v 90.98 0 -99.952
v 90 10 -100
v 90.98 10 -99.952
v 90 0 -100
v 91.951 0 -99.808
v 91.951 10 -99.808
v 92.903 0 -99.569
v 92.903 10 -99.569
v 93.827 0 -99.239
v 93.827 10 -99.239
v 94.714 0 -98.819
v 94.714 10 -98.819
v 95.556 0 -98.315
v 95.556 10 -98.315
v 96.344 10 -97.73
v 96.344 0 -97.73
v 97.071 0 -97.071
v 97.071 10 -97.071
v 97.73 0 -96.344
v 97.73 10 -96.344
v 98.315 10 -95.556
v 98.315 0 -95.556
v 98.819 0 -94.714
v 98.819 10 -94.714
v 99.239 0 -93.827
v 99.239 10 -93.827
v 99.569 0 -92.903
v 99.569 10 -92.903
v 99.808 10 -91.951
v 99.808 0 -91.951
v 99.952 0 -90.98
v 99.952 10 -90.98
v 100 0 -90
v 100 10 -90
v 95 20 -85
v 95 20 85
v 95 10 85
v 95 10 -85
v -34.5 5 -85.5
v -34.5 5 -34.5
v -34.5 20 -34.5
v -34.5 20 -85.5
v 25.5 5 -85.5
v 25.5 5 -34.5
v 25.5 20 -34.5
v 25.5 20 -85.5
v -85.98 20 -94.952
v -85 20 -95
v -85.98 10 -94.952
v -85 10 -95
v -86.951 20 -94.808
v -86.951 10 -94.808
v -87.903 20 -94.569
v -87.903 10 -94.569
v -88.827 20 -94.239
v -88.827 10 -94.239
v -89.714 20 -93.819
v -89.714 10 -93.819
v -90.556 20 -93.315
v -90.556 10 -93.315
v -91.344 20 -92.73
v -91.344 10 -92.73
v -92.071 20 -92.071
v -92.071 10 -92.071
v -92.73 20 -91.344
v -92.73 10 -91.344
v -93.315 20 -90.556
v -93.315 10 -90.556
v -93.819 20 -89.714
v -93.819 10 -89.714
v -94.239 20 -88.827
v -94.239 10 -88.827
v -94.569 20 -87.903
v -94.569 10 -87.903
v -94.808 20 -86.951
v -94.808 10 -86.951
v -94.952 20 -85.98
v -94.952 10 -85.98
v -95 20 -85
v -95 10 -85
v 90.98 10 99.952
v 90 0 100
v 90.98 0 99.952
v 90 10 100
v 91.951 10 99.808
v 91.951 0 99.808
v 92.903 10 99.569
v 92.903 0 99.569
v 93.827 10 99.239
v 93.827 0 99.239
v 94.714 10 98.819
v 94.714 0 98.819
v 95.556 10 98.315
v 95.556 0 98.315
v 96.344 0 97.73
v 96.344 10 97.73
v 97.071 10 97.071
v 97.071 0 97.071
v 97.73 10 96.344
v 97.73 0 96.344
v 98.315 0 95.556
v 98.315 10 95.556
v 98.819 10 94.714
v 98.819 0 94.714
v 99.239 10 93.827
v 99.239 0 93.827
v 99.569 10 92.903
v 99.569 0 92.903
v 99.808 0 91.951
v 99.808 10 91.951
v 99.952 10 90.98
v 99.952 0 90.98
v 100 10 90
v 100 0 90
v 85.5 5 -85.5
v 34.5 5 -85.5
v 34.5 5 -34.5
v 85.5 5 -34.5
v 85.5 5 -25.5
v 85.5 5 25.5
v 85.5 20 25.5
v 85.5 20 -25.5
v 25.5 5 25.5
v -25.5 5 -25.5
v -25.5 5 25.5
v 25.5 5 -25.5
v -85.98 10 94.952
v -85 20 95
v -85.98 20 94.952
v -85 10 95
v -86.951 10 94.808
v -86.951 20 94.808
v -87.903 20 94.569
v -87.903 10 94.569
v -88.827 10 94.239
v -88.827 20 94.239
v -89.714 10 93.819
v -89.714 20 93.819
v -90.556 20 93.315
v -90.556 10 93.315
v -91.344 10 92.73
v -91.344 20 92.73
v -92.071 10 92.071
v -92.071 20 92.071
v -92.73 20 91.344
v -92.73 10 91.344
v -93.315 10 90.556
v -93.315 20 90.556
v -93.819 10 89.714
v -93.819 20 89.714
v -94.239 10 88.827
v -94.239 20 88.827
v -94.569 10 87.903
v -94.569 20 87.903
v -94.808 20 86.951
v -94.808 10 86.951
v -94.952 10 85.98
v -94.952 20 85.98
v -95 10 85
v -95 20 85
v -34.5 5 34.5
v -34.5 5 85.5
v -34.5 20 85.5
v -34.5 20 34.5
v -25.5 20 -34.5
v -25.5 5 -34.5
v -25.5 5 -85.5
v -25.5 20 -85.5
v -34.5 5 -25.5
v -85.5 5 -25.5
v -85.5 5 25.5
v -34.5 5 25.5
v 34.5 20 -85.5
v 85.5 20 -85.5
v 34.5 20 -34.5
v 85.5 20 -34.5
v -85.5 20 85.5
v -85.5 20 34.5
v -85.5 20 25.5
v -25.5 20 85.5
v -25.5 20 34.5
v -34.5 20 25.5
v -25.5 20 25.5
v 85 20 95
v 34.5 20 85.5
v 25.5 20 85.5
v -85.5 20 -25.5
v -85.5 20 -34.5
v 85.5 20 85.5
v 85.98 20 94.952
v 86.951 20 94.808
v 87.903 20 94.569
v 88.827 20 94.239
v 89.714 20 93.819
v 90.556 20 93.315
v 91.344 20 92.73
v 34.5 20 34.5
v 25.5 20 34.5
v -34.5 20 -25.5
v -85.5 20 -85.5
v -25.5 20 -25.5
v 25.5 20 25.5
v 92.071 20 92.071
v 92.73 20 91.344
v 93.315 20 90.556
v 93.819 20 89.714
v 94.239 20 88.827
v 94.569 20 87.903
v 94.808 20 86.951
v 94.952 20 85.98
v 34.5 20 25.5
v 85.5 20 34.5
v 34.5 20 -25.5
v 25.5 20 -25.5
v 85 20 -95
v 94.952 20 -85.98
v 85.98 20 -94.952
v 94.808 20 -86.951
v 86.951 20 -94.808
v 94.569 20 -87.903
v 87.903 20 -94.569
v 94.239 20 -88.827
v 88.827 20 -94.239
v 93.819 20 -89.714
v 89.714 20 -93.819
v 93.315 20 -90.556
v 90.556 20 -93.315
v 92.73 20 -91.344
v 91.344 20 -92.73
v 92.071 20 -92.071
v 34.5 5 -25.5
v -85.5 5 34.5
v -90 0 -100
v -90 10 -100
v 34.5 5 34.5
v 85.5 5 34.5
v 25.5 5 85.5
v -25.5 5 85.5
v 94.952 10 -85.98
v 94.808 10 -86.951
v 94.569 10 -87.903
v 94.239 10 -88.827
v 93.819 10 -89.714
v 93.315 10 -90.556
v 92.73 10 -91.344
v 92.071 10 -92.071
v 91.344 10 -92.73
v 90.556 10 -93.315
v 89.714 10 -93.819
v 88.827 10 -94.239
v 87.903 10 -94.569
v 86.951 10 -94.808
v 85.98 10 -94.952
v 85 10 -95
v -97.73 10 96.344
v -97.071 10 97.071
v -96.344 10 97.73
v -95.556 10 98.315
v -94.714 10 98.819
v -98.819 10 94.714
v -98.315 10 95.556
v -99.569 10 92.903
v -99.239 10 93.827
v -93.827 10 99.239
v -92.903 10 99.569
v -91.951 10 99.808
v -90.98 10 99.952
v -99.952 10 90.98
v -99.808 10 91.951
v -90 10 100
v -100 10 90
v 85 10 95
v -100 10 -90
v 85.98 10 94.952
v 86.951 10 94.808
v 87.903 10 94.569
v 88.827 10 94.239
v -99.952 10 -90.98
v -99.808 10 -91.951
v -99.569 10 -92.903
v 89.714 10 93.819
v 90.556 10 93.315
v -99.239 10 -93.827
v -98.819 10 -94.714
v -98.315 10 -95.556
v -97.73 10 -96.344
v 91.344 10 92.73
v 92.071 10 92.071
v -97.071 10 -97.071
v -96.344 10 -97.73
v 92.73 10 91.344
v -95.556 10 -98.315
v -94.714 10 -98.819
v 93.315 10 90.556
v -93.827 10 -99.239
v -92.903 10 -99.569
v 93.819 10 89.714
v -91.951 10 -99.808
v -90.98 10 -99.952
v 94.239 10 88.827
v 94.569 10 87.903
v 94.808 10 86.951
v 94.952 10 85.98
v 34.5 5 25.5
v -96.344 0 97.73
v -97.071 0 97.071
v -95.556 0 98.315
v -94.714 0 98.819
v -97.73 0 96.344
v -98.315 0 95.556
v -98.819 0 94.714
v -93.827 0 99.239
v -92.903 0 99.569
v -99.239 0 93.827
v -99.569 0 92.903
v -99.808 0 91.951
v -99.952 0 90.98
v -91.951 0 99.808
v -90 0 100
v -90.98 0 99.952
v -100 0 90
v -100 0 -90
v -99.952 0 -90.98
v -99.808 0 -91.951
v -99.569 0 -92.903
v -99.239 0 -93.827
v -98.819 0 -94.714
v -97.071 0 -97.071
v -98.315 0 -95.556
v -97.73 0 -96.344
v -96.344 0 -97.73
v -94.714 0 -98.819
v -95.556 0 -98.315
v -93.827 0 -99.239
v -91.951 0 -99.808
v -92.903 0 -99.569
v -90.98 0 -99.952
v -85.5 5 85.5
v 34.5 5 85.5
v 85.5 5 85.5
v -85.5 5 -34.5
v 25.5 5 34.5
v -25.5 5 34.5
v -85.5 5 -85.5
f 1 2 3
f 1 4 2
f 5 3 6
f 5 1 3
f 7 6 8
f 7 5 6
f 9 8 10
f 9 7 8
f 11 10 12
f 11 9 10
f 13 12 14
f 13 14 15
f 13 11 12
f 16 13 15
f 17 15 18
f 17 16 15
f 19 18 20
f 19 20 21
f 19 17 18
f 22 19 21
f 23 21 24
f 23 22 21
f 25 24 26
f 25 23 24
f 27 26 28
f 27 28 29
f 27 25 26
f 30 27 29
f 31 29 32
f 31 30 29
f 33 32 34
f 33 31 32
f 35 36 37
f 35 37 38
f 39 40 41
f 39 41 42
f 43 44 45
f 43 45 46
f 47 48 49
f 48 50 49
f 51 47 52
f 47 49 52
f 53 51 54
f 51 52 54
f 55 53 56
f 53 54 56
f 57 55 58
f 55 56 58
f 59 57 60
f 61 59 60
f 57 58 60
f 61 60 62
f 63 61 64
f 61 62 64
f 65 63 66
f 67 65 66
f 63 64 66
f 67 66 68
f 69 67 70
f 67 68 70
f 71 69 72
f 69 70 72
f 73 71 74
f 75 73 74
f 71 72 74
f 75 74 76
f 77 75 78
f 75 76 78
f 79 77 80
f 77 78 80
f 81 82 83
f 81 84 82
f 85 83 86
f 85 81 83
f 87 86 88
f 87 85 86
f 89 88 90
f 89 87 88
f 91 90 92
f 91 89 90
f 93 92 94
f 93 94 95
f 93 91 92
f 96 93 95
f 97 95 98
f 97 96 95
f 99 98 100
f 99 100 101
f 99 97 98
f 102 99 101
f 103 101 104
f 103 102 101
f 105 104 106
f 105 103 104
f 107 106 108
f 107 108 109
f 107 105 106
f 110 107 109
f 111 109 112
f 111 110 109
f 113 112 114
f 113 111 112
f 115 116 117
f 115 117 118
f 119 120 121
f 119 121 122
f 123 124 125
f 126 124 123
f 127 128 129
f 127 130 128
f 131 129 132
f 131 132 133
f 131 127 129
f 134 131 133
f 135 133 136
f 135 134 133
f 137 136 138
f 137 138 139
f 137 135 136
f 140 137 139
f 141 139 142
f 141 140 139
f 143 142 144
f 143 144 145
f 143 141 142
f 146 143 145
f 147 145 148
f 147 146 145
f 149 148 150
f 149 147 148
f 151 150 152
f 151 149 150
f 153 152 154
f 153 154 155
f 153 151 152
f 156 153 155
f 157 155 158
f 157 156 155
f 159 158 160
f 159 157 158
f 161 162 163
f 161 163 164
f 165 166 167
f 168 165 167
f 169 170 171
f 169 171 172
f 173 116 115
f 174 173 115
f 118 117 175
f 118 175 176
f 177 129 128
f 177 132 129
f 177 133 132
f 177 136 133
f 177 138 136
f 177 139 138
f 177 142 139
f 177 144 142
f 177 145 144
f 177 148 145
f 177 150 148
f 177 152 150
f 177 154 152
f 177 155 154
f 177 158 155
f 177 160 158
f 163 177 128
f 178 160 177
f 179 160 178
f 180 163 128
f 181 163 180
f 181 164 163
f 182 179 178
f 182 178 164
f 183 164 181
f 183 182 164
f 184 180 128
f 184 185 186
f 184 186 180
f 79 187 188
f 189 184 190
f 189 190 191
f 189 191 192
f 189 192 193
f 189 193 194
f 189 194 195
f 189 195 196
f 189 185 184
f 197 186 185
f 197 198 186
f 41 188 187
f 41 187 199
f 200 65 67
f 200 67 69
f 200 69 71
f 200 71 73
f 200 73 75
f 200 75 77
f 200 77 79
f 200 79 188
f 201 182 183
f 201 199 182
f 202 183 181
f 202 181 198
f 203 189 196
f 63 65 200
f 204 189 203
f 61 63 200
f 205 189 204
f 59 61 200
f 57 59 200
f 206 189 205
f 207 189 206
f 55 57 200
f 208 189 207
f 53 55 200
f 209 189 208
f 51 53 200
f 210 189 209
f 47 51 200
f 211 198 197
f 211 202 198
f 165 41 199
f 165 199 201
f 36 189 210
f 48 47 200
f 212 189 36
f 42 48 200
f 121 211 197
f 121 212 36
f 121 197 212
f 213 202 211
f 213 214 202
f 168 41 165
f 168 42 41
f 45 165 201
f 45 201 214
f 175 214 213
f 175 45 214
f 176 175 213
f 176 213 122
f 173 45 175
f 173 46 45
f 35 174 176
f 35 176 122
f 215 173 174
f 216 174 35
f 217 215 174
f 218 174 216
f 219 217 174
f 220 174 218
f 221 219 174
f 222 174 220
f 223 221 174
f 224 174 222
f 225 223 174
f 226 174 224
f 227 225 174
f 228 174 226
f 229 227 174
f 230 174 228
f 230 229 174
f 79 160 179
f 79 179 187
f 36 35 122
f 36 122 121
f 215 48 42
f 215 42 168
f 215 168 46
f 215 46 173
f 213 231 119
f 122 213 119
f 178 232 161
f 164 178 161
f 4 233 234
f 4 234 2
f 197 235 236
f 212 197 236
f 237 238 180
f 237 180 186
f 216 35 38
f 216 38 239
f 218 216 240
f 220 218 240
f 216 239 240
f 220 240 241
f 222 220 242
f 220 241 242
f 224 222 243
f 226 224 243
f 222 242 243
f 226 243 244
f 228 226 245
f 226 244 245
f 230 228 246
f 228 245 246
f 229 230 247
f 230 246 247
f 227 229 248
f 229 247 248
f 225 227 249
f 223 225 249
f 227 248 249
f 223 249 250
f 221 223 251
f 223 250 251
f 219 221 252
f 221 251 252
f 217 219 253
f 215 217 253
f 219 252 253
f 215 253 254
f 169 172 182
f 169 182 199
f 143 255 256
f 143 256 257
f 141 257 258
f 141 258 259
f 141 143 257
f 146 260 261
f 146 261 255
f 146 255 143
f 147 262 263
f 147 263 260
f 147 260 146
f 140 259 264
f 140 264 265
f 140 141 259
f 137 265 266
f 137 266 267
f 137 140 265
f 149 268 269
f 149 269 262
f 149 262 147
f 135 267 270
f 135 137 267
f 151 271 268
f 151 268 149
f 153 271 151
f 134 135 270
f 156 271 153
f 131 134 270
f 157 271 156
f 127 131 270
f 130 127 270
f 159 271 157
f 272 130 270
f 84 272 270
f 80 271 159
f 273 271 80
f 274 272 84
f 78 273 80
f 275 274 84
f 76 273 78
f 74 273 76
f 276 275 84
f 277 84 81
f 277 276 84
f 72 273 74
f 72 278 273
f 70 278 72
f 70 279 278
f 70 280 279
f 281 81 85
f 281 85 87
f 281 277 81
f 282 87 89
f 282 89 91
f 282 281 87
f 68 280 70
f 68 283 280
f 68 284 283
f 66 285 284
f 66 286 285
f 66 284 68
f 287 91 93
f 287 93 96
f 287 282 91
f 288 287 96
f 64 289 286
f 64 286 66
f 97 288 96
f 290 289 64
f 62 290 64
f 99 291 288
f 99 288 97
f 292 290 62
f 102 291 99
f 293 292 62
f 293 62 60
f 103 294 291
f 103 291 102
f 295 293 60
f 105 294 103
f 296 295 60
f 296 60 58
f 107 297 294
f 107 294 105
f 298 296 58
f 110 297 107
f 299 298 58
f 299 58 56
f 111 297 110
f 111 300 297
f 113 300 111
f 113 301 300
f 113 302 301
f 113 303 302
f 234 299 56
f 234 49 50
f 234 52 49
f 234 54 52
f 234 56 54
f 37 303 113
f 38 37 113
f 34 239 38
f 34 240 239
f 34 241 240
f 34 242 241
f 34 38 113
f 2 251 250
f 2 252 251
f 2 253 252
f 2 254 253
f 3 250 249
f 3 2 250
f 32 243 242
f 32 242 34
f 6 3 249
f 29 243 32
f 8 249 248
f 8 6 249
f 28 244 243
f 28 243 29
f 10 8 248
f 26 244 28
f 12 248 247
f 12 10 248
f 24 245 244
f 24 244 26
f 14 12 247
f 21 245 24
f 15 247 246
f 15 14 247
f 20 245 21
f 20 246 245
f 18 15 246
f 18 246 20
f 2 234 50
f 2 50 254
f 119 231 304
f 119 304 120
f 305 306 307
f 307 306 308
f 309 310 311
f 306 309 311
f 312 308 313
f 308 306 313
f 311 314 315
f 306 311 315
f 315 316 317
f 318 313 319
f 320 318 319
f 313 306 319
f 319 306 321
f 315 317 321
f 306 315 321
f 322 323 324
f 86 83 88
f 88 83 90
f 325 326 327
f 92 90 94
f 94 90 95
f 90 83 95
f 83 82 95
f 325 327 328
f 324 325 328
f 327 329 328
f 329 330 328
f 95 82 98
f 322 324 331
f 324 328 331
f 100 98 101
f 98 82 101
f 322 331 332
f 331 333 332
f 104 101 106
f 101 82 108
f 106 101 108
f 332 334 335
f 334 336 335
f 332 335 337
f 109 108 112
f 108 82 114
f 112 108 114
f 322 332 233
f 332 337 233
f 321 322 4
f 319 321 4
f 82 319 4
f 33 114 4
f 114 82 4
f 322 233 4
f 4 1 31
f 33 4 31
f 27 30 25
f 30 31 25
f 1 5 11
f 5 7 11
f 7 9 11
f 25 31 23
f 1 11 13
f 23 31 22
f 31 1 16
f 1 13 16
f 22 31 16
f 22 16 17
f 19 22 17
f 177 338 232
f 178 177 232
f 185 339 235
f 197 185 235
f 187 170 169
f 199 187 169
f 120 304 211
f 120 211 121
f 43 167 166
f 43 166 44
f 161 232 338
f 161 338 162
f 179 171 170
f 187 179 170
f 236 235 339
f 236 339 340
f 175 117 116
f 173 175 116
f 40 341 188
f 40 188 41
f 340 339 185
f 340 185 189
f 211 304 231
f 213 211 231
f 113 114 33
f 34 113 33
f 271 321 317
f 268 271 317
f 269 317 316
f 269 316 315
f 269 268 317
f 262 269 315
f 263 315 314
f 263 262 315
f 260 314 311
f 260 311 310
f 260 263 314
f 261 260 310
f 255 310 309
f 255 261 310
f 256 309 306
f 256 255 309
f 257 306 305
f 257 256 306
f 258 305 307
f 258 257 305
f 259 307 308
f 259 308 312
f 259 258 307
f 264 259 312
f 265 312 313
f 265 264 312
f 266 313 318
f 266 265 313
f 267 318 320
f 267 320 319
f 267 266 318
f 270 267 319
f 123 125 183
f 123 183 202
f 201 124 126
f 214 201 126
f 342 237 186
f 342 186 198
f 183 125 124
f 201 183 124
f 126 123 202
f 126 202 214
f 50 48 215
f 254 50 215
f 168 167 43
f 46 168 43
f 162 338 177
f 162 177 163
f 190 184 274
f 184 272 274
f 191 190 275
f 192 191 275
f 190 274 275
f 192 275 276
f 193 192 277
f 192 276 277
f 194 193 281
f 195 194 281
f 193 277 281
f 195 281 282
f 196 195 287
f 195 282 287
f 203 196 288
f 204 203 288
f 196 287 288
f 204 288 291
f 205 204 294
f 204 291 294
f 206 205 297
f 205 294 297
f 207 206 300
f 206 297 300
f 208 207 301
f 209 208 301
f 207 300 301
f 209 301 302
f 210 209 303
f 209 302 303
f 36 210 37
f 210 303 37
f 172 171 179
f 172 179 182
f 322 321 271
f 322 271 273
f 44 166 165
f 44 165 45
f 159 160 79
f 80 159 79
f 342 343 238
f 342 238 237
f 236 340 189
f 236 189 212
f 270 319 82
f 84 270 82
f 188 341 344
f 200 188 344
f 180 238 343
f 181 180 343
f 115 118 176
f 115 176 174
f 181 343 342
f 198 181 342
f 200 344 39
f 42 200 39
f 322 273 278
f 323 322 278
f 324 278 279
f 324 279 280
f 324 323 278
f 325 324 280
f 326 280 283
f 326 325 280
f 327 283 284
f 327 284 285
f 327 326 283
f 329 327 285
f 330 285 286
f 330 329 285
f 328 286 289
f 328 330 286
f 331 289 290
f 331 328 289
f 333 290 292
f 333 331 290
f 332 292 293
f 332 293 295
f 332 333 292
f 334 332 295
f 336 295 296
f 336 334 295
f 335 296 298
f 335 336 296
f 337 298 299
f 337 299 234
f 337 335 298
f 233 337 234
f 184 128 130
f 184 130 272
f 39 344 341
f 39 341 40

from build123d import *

# Parameters (mm, degrees)
SKETCH_1_W          = 200
SKETCH_1_H          = 200
SKETCH_1_W_2        = 51
SKETCH_1_H_2        = 51
EXTRUDE_1_DEPTH     = 20
SKETCH_1_2_W        = 200
SKETCH_1_2_H        = 200
EXTRUDE_2_DEPTH     = 5
SKETCH_2_W          = 200
SKETCH_2_H          = 200
SKETCH_2_W_2        = 190
SKETCH_2_H_2        = 190
CUT_EXTRUDE_1_DEPTH = 10
FILLET_1_R          = 10


with BuildPart() as part:
    # 草图1 → 凸台-拉伸1 (new body)
    with BuildSketch(Plane(origin=(0, 0, 0), x_dir=(1, 0, 0), z_dir=(0, 1, 0))):
        Rectangle(SKETCH_1_W, SKETCH_1_H)
        with Locations((0, 60)):
            Rectangle(SKETCH_1_W_2, SKETCH_1_H_2, mode=Mode.SUBTRACT)
        with Locations((-60, 60)):
            Rectangle(SKETCH_1_W_2, SKETCH_1_H_2, mode=Mode.SUBTRACT)
        with Locations((60, 60)):
            Rectangle(SKETCH_1_W_2, SKETCH_1_H_2, mode=Mode.SUBTRACT)
        Rectangle(SKETCH_1_W_2, SKETCH_1_H_2, mode=Mode.SUBTRACT)
        with Locations((60, 0)):
            Rectangle(SKETCH_1_W_2, SKETCH_1_H_2, mode=Mode.SUBTRACT)
        with Locations((0, -60)):
            Rectangle(SKETCH_1_W_2, SKETCH_1_H_2, mode=Mode.SUBTRACT)
        with Locations((60, -60)):
            Rectangle(SKETCH_1_W_2, SKETCH_1_H_2, mode=Mode.SUBTRACT)
        with Locations((-60, 0)):
            Rectangle(SKETCH_1_W_2, SKETCH_1_H_2, mode=Mode.SUBTRACT)
        with Locations((-60, -60)):
            Rectangle(SKETCH_1_W_2, SKETCH_1_H_2, mode=Mode.SUBTRACT)
    extrude(amount=EXTRUDE_1_DEPTH)

    # 草图1<2> → 凸台-拉伸2 (add)
    with BuildSketch(Plane(origin=(0, 0, 0), x_dir=(1, 0, 0), z_dir=(0, 1, 0))):
        Rectangle(SKETCH_1_2_W, SKETCH_1_2_H)
    extrude(amount=EXTRUDE_2_DEPTH)

    # 草图2 → 切除-拉伸1 (cut)
    with BuildSketch(Plane(origin=(0, 20, 0), x_dir=(1, 0, 0), z_dir=(0, 1, 0))):
        Rectangle(SKETCH_2_W, SKETCH_2_H)
        Rectangle(SKETCH_2_W_2, SKETCH_2_H_2, mode=Mode.SUBTRACT)
    extrude(amount=-CUT_EXTRUDE_1_DEPTH, mode=Mode.SUBTRACT)

    # 圆角1
    fillet_1_edges = [part.edges().sort_by_distance(p)[0] for p in [
        (-100, 5, 100),
        (100, 5, 100),
        (-100, 5, -100),
        (100, 5, -100),
        (-95, 15, -95),
        (95, 15, -95),
        (95, 15, 95),
        (-95, 15, 95),
    ]]
    fillet(fillet_1_edges, radius=FILLET_1_R)


solid = part.part
